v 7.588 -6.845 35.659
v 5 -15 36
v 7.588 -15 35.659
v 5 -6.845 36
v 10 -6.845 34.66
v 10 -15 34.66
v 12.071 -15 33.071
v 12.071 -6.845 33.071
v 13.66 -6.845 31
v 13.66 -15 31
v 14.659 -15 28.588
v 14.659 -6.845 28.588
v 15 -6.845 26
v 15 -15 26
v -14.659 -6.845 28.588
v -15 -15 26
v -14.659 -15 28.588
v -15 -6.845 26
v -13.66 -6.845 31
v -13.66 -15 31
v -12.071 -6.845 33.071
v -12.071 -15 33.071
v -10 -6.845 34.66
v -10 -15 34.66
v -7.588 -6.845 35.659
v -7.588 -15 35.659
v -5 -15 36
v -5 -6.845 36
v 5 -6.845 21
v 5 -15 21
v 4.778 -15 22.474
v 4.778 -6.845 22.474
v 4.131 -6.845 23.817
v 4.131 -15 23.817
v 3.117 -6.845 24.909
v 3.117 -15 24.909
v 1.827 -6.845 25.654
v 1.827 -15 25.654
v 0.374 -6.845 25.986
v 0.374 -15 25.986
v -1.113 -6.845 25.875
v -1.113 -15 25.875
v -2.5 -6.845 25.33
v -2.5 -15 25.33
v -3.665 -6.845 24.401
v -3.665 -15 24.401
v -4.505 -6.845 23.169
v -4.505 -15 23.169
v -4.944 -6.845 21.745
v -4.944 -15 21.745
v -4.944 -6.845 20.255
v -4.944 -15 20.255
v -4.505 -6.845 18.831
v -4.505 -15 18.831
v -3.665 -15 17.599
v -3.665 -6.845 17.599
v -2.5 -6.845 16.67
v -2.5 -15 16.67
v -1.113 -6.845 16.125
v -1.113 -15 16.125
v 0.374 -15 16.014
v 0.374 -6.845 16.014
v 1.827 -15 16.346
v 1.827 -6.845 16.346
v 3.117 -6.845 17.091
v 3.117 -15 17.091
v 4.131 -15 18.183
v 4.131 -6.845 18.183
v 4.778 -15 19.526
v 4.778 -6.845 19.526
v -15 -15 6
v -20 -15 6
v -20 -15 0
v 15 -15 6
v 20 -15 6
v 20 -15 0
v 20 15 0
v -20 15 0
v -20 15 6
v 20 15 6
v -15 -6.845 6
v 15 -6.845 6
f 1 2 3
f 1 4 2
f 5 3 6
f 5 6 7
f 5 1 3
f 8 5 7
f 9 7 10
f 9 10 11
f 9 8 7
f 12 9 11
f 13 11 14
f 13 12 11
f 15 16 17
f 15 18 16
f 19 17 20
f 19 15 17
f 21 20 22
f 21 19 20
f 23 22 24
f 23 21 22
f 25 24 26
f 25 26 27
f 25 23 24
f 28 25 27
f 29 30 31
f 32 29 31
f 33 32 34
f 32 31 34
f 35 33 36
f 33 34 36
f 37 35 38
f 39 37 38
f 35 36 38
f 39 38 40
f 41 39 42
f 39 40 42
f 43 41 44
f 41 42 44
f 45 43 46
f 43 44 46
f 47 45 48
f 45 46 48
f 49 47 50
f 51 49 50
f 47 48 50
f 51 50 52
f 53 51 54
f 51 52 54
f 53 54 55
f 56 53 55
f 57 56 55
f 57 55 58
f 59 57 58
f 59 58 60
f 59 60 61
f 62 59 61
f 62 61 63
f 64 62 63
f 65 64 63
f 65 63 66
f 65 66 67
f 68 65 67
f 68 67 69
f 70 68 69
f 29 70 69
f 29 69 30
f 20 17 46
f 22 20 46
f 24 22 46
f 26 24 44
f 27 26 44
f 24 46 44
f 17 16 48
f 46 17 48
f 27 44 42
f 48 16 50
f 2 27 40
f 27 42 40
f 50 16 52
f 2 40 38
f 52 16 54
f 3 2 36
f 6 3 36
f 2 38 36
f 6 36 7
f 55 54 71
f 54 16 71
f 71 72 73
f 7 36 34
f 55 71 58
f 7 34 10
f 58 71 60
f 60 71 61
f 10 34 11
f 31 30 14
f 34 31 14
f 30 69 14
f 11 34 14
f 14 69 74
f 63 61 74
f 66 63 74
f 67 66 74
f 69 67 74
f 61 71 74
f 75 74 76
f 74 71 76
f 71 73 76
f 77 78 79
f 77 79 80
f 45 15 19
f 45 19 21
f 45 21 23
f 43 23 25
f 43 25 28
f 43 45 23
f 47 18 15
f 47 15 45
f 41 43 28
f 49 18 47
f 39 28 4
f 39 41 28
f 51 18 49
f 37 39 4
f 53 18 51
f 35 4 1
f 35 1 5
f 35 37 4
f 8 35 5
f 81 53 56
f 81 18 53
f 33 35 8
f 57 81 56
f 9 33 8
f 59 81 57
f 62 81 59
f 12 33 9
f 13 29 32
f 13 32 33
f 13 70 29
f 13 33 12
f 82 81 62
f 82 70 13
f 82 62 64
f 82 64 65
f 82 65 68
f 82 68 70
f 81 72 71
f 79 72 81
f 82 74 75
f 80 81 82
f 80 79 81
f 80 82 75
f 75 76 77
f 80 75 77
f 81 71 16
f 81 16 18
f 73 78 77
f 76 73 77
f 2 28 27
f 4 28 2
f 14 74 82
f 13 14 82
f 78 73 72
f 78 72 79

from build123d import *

# Parameters (mm, degrees)
SKETCH_1_W          = 40
SKETCH_1_H          = 30
EXTRUDE_2_DEPTH     = 6
SKETCH_2_W          = 30
SKETCH_2_H          = 8.15479
EXTRUDE_4_DEPTH     = 30
SKETCH_4_R          = 5
CUT_EXTRUDE_1_DEPTH = 51.950956811
FILLET_1_R          = 10
FILLET_2_R          = 10


with BuildPart() as part:
    # Эскиз1 → Бобышка-Вытянуть2 (new body)
    with BuildSketch(Plane.XY):
        Rectangle(SKETCH_1_W, SKETCH_1_H)
    extrude(amount=EXTRUDE_2_DEPTH)

    # Эскиз2 → Бобышка-Вытянуть4 (add)
    with BuildSketch(Plane.XY.offset(6)):
        with Locations((0, -10.922605)):
            Rectangle(SKETCH_2_W, SKETCH_2_H)
    extrude(amount=EXTRUDE_4_DEPTH)

    # Эскиз4 → Вырез-Вытянуть1 (cut, through all)
    with BuildSketch(Plane(origin=(0, -15, 0), x_dir=(-1, 0, 0), z_dir=(0, -1, 0))):
        with Locations(Location((0, -21, 0), (0, 0, 180))):
            Circle(SKETCH_4_R)
    extrude(amount=-CUT_EXTRUDE_1_DEPTH, mode=Mode.SUBTRACT)

    # Скругление1
    fillet_1_edges = [part.edges().sort_by_distance(p)[0] for p in [
        (-15, -10.922605, 36),
    ]]
    fillet(fillet_1_edges, radius=FILLET_1_R)

    # Скругление2
    fillet_2_edges = [part.edges().sort_by_distance(p)[0] for p in [
        (15, -10.922605, 36),
    ]]
    fillet(fillet_2_edges, radius=FILLET_2_R)


solid = part.part
